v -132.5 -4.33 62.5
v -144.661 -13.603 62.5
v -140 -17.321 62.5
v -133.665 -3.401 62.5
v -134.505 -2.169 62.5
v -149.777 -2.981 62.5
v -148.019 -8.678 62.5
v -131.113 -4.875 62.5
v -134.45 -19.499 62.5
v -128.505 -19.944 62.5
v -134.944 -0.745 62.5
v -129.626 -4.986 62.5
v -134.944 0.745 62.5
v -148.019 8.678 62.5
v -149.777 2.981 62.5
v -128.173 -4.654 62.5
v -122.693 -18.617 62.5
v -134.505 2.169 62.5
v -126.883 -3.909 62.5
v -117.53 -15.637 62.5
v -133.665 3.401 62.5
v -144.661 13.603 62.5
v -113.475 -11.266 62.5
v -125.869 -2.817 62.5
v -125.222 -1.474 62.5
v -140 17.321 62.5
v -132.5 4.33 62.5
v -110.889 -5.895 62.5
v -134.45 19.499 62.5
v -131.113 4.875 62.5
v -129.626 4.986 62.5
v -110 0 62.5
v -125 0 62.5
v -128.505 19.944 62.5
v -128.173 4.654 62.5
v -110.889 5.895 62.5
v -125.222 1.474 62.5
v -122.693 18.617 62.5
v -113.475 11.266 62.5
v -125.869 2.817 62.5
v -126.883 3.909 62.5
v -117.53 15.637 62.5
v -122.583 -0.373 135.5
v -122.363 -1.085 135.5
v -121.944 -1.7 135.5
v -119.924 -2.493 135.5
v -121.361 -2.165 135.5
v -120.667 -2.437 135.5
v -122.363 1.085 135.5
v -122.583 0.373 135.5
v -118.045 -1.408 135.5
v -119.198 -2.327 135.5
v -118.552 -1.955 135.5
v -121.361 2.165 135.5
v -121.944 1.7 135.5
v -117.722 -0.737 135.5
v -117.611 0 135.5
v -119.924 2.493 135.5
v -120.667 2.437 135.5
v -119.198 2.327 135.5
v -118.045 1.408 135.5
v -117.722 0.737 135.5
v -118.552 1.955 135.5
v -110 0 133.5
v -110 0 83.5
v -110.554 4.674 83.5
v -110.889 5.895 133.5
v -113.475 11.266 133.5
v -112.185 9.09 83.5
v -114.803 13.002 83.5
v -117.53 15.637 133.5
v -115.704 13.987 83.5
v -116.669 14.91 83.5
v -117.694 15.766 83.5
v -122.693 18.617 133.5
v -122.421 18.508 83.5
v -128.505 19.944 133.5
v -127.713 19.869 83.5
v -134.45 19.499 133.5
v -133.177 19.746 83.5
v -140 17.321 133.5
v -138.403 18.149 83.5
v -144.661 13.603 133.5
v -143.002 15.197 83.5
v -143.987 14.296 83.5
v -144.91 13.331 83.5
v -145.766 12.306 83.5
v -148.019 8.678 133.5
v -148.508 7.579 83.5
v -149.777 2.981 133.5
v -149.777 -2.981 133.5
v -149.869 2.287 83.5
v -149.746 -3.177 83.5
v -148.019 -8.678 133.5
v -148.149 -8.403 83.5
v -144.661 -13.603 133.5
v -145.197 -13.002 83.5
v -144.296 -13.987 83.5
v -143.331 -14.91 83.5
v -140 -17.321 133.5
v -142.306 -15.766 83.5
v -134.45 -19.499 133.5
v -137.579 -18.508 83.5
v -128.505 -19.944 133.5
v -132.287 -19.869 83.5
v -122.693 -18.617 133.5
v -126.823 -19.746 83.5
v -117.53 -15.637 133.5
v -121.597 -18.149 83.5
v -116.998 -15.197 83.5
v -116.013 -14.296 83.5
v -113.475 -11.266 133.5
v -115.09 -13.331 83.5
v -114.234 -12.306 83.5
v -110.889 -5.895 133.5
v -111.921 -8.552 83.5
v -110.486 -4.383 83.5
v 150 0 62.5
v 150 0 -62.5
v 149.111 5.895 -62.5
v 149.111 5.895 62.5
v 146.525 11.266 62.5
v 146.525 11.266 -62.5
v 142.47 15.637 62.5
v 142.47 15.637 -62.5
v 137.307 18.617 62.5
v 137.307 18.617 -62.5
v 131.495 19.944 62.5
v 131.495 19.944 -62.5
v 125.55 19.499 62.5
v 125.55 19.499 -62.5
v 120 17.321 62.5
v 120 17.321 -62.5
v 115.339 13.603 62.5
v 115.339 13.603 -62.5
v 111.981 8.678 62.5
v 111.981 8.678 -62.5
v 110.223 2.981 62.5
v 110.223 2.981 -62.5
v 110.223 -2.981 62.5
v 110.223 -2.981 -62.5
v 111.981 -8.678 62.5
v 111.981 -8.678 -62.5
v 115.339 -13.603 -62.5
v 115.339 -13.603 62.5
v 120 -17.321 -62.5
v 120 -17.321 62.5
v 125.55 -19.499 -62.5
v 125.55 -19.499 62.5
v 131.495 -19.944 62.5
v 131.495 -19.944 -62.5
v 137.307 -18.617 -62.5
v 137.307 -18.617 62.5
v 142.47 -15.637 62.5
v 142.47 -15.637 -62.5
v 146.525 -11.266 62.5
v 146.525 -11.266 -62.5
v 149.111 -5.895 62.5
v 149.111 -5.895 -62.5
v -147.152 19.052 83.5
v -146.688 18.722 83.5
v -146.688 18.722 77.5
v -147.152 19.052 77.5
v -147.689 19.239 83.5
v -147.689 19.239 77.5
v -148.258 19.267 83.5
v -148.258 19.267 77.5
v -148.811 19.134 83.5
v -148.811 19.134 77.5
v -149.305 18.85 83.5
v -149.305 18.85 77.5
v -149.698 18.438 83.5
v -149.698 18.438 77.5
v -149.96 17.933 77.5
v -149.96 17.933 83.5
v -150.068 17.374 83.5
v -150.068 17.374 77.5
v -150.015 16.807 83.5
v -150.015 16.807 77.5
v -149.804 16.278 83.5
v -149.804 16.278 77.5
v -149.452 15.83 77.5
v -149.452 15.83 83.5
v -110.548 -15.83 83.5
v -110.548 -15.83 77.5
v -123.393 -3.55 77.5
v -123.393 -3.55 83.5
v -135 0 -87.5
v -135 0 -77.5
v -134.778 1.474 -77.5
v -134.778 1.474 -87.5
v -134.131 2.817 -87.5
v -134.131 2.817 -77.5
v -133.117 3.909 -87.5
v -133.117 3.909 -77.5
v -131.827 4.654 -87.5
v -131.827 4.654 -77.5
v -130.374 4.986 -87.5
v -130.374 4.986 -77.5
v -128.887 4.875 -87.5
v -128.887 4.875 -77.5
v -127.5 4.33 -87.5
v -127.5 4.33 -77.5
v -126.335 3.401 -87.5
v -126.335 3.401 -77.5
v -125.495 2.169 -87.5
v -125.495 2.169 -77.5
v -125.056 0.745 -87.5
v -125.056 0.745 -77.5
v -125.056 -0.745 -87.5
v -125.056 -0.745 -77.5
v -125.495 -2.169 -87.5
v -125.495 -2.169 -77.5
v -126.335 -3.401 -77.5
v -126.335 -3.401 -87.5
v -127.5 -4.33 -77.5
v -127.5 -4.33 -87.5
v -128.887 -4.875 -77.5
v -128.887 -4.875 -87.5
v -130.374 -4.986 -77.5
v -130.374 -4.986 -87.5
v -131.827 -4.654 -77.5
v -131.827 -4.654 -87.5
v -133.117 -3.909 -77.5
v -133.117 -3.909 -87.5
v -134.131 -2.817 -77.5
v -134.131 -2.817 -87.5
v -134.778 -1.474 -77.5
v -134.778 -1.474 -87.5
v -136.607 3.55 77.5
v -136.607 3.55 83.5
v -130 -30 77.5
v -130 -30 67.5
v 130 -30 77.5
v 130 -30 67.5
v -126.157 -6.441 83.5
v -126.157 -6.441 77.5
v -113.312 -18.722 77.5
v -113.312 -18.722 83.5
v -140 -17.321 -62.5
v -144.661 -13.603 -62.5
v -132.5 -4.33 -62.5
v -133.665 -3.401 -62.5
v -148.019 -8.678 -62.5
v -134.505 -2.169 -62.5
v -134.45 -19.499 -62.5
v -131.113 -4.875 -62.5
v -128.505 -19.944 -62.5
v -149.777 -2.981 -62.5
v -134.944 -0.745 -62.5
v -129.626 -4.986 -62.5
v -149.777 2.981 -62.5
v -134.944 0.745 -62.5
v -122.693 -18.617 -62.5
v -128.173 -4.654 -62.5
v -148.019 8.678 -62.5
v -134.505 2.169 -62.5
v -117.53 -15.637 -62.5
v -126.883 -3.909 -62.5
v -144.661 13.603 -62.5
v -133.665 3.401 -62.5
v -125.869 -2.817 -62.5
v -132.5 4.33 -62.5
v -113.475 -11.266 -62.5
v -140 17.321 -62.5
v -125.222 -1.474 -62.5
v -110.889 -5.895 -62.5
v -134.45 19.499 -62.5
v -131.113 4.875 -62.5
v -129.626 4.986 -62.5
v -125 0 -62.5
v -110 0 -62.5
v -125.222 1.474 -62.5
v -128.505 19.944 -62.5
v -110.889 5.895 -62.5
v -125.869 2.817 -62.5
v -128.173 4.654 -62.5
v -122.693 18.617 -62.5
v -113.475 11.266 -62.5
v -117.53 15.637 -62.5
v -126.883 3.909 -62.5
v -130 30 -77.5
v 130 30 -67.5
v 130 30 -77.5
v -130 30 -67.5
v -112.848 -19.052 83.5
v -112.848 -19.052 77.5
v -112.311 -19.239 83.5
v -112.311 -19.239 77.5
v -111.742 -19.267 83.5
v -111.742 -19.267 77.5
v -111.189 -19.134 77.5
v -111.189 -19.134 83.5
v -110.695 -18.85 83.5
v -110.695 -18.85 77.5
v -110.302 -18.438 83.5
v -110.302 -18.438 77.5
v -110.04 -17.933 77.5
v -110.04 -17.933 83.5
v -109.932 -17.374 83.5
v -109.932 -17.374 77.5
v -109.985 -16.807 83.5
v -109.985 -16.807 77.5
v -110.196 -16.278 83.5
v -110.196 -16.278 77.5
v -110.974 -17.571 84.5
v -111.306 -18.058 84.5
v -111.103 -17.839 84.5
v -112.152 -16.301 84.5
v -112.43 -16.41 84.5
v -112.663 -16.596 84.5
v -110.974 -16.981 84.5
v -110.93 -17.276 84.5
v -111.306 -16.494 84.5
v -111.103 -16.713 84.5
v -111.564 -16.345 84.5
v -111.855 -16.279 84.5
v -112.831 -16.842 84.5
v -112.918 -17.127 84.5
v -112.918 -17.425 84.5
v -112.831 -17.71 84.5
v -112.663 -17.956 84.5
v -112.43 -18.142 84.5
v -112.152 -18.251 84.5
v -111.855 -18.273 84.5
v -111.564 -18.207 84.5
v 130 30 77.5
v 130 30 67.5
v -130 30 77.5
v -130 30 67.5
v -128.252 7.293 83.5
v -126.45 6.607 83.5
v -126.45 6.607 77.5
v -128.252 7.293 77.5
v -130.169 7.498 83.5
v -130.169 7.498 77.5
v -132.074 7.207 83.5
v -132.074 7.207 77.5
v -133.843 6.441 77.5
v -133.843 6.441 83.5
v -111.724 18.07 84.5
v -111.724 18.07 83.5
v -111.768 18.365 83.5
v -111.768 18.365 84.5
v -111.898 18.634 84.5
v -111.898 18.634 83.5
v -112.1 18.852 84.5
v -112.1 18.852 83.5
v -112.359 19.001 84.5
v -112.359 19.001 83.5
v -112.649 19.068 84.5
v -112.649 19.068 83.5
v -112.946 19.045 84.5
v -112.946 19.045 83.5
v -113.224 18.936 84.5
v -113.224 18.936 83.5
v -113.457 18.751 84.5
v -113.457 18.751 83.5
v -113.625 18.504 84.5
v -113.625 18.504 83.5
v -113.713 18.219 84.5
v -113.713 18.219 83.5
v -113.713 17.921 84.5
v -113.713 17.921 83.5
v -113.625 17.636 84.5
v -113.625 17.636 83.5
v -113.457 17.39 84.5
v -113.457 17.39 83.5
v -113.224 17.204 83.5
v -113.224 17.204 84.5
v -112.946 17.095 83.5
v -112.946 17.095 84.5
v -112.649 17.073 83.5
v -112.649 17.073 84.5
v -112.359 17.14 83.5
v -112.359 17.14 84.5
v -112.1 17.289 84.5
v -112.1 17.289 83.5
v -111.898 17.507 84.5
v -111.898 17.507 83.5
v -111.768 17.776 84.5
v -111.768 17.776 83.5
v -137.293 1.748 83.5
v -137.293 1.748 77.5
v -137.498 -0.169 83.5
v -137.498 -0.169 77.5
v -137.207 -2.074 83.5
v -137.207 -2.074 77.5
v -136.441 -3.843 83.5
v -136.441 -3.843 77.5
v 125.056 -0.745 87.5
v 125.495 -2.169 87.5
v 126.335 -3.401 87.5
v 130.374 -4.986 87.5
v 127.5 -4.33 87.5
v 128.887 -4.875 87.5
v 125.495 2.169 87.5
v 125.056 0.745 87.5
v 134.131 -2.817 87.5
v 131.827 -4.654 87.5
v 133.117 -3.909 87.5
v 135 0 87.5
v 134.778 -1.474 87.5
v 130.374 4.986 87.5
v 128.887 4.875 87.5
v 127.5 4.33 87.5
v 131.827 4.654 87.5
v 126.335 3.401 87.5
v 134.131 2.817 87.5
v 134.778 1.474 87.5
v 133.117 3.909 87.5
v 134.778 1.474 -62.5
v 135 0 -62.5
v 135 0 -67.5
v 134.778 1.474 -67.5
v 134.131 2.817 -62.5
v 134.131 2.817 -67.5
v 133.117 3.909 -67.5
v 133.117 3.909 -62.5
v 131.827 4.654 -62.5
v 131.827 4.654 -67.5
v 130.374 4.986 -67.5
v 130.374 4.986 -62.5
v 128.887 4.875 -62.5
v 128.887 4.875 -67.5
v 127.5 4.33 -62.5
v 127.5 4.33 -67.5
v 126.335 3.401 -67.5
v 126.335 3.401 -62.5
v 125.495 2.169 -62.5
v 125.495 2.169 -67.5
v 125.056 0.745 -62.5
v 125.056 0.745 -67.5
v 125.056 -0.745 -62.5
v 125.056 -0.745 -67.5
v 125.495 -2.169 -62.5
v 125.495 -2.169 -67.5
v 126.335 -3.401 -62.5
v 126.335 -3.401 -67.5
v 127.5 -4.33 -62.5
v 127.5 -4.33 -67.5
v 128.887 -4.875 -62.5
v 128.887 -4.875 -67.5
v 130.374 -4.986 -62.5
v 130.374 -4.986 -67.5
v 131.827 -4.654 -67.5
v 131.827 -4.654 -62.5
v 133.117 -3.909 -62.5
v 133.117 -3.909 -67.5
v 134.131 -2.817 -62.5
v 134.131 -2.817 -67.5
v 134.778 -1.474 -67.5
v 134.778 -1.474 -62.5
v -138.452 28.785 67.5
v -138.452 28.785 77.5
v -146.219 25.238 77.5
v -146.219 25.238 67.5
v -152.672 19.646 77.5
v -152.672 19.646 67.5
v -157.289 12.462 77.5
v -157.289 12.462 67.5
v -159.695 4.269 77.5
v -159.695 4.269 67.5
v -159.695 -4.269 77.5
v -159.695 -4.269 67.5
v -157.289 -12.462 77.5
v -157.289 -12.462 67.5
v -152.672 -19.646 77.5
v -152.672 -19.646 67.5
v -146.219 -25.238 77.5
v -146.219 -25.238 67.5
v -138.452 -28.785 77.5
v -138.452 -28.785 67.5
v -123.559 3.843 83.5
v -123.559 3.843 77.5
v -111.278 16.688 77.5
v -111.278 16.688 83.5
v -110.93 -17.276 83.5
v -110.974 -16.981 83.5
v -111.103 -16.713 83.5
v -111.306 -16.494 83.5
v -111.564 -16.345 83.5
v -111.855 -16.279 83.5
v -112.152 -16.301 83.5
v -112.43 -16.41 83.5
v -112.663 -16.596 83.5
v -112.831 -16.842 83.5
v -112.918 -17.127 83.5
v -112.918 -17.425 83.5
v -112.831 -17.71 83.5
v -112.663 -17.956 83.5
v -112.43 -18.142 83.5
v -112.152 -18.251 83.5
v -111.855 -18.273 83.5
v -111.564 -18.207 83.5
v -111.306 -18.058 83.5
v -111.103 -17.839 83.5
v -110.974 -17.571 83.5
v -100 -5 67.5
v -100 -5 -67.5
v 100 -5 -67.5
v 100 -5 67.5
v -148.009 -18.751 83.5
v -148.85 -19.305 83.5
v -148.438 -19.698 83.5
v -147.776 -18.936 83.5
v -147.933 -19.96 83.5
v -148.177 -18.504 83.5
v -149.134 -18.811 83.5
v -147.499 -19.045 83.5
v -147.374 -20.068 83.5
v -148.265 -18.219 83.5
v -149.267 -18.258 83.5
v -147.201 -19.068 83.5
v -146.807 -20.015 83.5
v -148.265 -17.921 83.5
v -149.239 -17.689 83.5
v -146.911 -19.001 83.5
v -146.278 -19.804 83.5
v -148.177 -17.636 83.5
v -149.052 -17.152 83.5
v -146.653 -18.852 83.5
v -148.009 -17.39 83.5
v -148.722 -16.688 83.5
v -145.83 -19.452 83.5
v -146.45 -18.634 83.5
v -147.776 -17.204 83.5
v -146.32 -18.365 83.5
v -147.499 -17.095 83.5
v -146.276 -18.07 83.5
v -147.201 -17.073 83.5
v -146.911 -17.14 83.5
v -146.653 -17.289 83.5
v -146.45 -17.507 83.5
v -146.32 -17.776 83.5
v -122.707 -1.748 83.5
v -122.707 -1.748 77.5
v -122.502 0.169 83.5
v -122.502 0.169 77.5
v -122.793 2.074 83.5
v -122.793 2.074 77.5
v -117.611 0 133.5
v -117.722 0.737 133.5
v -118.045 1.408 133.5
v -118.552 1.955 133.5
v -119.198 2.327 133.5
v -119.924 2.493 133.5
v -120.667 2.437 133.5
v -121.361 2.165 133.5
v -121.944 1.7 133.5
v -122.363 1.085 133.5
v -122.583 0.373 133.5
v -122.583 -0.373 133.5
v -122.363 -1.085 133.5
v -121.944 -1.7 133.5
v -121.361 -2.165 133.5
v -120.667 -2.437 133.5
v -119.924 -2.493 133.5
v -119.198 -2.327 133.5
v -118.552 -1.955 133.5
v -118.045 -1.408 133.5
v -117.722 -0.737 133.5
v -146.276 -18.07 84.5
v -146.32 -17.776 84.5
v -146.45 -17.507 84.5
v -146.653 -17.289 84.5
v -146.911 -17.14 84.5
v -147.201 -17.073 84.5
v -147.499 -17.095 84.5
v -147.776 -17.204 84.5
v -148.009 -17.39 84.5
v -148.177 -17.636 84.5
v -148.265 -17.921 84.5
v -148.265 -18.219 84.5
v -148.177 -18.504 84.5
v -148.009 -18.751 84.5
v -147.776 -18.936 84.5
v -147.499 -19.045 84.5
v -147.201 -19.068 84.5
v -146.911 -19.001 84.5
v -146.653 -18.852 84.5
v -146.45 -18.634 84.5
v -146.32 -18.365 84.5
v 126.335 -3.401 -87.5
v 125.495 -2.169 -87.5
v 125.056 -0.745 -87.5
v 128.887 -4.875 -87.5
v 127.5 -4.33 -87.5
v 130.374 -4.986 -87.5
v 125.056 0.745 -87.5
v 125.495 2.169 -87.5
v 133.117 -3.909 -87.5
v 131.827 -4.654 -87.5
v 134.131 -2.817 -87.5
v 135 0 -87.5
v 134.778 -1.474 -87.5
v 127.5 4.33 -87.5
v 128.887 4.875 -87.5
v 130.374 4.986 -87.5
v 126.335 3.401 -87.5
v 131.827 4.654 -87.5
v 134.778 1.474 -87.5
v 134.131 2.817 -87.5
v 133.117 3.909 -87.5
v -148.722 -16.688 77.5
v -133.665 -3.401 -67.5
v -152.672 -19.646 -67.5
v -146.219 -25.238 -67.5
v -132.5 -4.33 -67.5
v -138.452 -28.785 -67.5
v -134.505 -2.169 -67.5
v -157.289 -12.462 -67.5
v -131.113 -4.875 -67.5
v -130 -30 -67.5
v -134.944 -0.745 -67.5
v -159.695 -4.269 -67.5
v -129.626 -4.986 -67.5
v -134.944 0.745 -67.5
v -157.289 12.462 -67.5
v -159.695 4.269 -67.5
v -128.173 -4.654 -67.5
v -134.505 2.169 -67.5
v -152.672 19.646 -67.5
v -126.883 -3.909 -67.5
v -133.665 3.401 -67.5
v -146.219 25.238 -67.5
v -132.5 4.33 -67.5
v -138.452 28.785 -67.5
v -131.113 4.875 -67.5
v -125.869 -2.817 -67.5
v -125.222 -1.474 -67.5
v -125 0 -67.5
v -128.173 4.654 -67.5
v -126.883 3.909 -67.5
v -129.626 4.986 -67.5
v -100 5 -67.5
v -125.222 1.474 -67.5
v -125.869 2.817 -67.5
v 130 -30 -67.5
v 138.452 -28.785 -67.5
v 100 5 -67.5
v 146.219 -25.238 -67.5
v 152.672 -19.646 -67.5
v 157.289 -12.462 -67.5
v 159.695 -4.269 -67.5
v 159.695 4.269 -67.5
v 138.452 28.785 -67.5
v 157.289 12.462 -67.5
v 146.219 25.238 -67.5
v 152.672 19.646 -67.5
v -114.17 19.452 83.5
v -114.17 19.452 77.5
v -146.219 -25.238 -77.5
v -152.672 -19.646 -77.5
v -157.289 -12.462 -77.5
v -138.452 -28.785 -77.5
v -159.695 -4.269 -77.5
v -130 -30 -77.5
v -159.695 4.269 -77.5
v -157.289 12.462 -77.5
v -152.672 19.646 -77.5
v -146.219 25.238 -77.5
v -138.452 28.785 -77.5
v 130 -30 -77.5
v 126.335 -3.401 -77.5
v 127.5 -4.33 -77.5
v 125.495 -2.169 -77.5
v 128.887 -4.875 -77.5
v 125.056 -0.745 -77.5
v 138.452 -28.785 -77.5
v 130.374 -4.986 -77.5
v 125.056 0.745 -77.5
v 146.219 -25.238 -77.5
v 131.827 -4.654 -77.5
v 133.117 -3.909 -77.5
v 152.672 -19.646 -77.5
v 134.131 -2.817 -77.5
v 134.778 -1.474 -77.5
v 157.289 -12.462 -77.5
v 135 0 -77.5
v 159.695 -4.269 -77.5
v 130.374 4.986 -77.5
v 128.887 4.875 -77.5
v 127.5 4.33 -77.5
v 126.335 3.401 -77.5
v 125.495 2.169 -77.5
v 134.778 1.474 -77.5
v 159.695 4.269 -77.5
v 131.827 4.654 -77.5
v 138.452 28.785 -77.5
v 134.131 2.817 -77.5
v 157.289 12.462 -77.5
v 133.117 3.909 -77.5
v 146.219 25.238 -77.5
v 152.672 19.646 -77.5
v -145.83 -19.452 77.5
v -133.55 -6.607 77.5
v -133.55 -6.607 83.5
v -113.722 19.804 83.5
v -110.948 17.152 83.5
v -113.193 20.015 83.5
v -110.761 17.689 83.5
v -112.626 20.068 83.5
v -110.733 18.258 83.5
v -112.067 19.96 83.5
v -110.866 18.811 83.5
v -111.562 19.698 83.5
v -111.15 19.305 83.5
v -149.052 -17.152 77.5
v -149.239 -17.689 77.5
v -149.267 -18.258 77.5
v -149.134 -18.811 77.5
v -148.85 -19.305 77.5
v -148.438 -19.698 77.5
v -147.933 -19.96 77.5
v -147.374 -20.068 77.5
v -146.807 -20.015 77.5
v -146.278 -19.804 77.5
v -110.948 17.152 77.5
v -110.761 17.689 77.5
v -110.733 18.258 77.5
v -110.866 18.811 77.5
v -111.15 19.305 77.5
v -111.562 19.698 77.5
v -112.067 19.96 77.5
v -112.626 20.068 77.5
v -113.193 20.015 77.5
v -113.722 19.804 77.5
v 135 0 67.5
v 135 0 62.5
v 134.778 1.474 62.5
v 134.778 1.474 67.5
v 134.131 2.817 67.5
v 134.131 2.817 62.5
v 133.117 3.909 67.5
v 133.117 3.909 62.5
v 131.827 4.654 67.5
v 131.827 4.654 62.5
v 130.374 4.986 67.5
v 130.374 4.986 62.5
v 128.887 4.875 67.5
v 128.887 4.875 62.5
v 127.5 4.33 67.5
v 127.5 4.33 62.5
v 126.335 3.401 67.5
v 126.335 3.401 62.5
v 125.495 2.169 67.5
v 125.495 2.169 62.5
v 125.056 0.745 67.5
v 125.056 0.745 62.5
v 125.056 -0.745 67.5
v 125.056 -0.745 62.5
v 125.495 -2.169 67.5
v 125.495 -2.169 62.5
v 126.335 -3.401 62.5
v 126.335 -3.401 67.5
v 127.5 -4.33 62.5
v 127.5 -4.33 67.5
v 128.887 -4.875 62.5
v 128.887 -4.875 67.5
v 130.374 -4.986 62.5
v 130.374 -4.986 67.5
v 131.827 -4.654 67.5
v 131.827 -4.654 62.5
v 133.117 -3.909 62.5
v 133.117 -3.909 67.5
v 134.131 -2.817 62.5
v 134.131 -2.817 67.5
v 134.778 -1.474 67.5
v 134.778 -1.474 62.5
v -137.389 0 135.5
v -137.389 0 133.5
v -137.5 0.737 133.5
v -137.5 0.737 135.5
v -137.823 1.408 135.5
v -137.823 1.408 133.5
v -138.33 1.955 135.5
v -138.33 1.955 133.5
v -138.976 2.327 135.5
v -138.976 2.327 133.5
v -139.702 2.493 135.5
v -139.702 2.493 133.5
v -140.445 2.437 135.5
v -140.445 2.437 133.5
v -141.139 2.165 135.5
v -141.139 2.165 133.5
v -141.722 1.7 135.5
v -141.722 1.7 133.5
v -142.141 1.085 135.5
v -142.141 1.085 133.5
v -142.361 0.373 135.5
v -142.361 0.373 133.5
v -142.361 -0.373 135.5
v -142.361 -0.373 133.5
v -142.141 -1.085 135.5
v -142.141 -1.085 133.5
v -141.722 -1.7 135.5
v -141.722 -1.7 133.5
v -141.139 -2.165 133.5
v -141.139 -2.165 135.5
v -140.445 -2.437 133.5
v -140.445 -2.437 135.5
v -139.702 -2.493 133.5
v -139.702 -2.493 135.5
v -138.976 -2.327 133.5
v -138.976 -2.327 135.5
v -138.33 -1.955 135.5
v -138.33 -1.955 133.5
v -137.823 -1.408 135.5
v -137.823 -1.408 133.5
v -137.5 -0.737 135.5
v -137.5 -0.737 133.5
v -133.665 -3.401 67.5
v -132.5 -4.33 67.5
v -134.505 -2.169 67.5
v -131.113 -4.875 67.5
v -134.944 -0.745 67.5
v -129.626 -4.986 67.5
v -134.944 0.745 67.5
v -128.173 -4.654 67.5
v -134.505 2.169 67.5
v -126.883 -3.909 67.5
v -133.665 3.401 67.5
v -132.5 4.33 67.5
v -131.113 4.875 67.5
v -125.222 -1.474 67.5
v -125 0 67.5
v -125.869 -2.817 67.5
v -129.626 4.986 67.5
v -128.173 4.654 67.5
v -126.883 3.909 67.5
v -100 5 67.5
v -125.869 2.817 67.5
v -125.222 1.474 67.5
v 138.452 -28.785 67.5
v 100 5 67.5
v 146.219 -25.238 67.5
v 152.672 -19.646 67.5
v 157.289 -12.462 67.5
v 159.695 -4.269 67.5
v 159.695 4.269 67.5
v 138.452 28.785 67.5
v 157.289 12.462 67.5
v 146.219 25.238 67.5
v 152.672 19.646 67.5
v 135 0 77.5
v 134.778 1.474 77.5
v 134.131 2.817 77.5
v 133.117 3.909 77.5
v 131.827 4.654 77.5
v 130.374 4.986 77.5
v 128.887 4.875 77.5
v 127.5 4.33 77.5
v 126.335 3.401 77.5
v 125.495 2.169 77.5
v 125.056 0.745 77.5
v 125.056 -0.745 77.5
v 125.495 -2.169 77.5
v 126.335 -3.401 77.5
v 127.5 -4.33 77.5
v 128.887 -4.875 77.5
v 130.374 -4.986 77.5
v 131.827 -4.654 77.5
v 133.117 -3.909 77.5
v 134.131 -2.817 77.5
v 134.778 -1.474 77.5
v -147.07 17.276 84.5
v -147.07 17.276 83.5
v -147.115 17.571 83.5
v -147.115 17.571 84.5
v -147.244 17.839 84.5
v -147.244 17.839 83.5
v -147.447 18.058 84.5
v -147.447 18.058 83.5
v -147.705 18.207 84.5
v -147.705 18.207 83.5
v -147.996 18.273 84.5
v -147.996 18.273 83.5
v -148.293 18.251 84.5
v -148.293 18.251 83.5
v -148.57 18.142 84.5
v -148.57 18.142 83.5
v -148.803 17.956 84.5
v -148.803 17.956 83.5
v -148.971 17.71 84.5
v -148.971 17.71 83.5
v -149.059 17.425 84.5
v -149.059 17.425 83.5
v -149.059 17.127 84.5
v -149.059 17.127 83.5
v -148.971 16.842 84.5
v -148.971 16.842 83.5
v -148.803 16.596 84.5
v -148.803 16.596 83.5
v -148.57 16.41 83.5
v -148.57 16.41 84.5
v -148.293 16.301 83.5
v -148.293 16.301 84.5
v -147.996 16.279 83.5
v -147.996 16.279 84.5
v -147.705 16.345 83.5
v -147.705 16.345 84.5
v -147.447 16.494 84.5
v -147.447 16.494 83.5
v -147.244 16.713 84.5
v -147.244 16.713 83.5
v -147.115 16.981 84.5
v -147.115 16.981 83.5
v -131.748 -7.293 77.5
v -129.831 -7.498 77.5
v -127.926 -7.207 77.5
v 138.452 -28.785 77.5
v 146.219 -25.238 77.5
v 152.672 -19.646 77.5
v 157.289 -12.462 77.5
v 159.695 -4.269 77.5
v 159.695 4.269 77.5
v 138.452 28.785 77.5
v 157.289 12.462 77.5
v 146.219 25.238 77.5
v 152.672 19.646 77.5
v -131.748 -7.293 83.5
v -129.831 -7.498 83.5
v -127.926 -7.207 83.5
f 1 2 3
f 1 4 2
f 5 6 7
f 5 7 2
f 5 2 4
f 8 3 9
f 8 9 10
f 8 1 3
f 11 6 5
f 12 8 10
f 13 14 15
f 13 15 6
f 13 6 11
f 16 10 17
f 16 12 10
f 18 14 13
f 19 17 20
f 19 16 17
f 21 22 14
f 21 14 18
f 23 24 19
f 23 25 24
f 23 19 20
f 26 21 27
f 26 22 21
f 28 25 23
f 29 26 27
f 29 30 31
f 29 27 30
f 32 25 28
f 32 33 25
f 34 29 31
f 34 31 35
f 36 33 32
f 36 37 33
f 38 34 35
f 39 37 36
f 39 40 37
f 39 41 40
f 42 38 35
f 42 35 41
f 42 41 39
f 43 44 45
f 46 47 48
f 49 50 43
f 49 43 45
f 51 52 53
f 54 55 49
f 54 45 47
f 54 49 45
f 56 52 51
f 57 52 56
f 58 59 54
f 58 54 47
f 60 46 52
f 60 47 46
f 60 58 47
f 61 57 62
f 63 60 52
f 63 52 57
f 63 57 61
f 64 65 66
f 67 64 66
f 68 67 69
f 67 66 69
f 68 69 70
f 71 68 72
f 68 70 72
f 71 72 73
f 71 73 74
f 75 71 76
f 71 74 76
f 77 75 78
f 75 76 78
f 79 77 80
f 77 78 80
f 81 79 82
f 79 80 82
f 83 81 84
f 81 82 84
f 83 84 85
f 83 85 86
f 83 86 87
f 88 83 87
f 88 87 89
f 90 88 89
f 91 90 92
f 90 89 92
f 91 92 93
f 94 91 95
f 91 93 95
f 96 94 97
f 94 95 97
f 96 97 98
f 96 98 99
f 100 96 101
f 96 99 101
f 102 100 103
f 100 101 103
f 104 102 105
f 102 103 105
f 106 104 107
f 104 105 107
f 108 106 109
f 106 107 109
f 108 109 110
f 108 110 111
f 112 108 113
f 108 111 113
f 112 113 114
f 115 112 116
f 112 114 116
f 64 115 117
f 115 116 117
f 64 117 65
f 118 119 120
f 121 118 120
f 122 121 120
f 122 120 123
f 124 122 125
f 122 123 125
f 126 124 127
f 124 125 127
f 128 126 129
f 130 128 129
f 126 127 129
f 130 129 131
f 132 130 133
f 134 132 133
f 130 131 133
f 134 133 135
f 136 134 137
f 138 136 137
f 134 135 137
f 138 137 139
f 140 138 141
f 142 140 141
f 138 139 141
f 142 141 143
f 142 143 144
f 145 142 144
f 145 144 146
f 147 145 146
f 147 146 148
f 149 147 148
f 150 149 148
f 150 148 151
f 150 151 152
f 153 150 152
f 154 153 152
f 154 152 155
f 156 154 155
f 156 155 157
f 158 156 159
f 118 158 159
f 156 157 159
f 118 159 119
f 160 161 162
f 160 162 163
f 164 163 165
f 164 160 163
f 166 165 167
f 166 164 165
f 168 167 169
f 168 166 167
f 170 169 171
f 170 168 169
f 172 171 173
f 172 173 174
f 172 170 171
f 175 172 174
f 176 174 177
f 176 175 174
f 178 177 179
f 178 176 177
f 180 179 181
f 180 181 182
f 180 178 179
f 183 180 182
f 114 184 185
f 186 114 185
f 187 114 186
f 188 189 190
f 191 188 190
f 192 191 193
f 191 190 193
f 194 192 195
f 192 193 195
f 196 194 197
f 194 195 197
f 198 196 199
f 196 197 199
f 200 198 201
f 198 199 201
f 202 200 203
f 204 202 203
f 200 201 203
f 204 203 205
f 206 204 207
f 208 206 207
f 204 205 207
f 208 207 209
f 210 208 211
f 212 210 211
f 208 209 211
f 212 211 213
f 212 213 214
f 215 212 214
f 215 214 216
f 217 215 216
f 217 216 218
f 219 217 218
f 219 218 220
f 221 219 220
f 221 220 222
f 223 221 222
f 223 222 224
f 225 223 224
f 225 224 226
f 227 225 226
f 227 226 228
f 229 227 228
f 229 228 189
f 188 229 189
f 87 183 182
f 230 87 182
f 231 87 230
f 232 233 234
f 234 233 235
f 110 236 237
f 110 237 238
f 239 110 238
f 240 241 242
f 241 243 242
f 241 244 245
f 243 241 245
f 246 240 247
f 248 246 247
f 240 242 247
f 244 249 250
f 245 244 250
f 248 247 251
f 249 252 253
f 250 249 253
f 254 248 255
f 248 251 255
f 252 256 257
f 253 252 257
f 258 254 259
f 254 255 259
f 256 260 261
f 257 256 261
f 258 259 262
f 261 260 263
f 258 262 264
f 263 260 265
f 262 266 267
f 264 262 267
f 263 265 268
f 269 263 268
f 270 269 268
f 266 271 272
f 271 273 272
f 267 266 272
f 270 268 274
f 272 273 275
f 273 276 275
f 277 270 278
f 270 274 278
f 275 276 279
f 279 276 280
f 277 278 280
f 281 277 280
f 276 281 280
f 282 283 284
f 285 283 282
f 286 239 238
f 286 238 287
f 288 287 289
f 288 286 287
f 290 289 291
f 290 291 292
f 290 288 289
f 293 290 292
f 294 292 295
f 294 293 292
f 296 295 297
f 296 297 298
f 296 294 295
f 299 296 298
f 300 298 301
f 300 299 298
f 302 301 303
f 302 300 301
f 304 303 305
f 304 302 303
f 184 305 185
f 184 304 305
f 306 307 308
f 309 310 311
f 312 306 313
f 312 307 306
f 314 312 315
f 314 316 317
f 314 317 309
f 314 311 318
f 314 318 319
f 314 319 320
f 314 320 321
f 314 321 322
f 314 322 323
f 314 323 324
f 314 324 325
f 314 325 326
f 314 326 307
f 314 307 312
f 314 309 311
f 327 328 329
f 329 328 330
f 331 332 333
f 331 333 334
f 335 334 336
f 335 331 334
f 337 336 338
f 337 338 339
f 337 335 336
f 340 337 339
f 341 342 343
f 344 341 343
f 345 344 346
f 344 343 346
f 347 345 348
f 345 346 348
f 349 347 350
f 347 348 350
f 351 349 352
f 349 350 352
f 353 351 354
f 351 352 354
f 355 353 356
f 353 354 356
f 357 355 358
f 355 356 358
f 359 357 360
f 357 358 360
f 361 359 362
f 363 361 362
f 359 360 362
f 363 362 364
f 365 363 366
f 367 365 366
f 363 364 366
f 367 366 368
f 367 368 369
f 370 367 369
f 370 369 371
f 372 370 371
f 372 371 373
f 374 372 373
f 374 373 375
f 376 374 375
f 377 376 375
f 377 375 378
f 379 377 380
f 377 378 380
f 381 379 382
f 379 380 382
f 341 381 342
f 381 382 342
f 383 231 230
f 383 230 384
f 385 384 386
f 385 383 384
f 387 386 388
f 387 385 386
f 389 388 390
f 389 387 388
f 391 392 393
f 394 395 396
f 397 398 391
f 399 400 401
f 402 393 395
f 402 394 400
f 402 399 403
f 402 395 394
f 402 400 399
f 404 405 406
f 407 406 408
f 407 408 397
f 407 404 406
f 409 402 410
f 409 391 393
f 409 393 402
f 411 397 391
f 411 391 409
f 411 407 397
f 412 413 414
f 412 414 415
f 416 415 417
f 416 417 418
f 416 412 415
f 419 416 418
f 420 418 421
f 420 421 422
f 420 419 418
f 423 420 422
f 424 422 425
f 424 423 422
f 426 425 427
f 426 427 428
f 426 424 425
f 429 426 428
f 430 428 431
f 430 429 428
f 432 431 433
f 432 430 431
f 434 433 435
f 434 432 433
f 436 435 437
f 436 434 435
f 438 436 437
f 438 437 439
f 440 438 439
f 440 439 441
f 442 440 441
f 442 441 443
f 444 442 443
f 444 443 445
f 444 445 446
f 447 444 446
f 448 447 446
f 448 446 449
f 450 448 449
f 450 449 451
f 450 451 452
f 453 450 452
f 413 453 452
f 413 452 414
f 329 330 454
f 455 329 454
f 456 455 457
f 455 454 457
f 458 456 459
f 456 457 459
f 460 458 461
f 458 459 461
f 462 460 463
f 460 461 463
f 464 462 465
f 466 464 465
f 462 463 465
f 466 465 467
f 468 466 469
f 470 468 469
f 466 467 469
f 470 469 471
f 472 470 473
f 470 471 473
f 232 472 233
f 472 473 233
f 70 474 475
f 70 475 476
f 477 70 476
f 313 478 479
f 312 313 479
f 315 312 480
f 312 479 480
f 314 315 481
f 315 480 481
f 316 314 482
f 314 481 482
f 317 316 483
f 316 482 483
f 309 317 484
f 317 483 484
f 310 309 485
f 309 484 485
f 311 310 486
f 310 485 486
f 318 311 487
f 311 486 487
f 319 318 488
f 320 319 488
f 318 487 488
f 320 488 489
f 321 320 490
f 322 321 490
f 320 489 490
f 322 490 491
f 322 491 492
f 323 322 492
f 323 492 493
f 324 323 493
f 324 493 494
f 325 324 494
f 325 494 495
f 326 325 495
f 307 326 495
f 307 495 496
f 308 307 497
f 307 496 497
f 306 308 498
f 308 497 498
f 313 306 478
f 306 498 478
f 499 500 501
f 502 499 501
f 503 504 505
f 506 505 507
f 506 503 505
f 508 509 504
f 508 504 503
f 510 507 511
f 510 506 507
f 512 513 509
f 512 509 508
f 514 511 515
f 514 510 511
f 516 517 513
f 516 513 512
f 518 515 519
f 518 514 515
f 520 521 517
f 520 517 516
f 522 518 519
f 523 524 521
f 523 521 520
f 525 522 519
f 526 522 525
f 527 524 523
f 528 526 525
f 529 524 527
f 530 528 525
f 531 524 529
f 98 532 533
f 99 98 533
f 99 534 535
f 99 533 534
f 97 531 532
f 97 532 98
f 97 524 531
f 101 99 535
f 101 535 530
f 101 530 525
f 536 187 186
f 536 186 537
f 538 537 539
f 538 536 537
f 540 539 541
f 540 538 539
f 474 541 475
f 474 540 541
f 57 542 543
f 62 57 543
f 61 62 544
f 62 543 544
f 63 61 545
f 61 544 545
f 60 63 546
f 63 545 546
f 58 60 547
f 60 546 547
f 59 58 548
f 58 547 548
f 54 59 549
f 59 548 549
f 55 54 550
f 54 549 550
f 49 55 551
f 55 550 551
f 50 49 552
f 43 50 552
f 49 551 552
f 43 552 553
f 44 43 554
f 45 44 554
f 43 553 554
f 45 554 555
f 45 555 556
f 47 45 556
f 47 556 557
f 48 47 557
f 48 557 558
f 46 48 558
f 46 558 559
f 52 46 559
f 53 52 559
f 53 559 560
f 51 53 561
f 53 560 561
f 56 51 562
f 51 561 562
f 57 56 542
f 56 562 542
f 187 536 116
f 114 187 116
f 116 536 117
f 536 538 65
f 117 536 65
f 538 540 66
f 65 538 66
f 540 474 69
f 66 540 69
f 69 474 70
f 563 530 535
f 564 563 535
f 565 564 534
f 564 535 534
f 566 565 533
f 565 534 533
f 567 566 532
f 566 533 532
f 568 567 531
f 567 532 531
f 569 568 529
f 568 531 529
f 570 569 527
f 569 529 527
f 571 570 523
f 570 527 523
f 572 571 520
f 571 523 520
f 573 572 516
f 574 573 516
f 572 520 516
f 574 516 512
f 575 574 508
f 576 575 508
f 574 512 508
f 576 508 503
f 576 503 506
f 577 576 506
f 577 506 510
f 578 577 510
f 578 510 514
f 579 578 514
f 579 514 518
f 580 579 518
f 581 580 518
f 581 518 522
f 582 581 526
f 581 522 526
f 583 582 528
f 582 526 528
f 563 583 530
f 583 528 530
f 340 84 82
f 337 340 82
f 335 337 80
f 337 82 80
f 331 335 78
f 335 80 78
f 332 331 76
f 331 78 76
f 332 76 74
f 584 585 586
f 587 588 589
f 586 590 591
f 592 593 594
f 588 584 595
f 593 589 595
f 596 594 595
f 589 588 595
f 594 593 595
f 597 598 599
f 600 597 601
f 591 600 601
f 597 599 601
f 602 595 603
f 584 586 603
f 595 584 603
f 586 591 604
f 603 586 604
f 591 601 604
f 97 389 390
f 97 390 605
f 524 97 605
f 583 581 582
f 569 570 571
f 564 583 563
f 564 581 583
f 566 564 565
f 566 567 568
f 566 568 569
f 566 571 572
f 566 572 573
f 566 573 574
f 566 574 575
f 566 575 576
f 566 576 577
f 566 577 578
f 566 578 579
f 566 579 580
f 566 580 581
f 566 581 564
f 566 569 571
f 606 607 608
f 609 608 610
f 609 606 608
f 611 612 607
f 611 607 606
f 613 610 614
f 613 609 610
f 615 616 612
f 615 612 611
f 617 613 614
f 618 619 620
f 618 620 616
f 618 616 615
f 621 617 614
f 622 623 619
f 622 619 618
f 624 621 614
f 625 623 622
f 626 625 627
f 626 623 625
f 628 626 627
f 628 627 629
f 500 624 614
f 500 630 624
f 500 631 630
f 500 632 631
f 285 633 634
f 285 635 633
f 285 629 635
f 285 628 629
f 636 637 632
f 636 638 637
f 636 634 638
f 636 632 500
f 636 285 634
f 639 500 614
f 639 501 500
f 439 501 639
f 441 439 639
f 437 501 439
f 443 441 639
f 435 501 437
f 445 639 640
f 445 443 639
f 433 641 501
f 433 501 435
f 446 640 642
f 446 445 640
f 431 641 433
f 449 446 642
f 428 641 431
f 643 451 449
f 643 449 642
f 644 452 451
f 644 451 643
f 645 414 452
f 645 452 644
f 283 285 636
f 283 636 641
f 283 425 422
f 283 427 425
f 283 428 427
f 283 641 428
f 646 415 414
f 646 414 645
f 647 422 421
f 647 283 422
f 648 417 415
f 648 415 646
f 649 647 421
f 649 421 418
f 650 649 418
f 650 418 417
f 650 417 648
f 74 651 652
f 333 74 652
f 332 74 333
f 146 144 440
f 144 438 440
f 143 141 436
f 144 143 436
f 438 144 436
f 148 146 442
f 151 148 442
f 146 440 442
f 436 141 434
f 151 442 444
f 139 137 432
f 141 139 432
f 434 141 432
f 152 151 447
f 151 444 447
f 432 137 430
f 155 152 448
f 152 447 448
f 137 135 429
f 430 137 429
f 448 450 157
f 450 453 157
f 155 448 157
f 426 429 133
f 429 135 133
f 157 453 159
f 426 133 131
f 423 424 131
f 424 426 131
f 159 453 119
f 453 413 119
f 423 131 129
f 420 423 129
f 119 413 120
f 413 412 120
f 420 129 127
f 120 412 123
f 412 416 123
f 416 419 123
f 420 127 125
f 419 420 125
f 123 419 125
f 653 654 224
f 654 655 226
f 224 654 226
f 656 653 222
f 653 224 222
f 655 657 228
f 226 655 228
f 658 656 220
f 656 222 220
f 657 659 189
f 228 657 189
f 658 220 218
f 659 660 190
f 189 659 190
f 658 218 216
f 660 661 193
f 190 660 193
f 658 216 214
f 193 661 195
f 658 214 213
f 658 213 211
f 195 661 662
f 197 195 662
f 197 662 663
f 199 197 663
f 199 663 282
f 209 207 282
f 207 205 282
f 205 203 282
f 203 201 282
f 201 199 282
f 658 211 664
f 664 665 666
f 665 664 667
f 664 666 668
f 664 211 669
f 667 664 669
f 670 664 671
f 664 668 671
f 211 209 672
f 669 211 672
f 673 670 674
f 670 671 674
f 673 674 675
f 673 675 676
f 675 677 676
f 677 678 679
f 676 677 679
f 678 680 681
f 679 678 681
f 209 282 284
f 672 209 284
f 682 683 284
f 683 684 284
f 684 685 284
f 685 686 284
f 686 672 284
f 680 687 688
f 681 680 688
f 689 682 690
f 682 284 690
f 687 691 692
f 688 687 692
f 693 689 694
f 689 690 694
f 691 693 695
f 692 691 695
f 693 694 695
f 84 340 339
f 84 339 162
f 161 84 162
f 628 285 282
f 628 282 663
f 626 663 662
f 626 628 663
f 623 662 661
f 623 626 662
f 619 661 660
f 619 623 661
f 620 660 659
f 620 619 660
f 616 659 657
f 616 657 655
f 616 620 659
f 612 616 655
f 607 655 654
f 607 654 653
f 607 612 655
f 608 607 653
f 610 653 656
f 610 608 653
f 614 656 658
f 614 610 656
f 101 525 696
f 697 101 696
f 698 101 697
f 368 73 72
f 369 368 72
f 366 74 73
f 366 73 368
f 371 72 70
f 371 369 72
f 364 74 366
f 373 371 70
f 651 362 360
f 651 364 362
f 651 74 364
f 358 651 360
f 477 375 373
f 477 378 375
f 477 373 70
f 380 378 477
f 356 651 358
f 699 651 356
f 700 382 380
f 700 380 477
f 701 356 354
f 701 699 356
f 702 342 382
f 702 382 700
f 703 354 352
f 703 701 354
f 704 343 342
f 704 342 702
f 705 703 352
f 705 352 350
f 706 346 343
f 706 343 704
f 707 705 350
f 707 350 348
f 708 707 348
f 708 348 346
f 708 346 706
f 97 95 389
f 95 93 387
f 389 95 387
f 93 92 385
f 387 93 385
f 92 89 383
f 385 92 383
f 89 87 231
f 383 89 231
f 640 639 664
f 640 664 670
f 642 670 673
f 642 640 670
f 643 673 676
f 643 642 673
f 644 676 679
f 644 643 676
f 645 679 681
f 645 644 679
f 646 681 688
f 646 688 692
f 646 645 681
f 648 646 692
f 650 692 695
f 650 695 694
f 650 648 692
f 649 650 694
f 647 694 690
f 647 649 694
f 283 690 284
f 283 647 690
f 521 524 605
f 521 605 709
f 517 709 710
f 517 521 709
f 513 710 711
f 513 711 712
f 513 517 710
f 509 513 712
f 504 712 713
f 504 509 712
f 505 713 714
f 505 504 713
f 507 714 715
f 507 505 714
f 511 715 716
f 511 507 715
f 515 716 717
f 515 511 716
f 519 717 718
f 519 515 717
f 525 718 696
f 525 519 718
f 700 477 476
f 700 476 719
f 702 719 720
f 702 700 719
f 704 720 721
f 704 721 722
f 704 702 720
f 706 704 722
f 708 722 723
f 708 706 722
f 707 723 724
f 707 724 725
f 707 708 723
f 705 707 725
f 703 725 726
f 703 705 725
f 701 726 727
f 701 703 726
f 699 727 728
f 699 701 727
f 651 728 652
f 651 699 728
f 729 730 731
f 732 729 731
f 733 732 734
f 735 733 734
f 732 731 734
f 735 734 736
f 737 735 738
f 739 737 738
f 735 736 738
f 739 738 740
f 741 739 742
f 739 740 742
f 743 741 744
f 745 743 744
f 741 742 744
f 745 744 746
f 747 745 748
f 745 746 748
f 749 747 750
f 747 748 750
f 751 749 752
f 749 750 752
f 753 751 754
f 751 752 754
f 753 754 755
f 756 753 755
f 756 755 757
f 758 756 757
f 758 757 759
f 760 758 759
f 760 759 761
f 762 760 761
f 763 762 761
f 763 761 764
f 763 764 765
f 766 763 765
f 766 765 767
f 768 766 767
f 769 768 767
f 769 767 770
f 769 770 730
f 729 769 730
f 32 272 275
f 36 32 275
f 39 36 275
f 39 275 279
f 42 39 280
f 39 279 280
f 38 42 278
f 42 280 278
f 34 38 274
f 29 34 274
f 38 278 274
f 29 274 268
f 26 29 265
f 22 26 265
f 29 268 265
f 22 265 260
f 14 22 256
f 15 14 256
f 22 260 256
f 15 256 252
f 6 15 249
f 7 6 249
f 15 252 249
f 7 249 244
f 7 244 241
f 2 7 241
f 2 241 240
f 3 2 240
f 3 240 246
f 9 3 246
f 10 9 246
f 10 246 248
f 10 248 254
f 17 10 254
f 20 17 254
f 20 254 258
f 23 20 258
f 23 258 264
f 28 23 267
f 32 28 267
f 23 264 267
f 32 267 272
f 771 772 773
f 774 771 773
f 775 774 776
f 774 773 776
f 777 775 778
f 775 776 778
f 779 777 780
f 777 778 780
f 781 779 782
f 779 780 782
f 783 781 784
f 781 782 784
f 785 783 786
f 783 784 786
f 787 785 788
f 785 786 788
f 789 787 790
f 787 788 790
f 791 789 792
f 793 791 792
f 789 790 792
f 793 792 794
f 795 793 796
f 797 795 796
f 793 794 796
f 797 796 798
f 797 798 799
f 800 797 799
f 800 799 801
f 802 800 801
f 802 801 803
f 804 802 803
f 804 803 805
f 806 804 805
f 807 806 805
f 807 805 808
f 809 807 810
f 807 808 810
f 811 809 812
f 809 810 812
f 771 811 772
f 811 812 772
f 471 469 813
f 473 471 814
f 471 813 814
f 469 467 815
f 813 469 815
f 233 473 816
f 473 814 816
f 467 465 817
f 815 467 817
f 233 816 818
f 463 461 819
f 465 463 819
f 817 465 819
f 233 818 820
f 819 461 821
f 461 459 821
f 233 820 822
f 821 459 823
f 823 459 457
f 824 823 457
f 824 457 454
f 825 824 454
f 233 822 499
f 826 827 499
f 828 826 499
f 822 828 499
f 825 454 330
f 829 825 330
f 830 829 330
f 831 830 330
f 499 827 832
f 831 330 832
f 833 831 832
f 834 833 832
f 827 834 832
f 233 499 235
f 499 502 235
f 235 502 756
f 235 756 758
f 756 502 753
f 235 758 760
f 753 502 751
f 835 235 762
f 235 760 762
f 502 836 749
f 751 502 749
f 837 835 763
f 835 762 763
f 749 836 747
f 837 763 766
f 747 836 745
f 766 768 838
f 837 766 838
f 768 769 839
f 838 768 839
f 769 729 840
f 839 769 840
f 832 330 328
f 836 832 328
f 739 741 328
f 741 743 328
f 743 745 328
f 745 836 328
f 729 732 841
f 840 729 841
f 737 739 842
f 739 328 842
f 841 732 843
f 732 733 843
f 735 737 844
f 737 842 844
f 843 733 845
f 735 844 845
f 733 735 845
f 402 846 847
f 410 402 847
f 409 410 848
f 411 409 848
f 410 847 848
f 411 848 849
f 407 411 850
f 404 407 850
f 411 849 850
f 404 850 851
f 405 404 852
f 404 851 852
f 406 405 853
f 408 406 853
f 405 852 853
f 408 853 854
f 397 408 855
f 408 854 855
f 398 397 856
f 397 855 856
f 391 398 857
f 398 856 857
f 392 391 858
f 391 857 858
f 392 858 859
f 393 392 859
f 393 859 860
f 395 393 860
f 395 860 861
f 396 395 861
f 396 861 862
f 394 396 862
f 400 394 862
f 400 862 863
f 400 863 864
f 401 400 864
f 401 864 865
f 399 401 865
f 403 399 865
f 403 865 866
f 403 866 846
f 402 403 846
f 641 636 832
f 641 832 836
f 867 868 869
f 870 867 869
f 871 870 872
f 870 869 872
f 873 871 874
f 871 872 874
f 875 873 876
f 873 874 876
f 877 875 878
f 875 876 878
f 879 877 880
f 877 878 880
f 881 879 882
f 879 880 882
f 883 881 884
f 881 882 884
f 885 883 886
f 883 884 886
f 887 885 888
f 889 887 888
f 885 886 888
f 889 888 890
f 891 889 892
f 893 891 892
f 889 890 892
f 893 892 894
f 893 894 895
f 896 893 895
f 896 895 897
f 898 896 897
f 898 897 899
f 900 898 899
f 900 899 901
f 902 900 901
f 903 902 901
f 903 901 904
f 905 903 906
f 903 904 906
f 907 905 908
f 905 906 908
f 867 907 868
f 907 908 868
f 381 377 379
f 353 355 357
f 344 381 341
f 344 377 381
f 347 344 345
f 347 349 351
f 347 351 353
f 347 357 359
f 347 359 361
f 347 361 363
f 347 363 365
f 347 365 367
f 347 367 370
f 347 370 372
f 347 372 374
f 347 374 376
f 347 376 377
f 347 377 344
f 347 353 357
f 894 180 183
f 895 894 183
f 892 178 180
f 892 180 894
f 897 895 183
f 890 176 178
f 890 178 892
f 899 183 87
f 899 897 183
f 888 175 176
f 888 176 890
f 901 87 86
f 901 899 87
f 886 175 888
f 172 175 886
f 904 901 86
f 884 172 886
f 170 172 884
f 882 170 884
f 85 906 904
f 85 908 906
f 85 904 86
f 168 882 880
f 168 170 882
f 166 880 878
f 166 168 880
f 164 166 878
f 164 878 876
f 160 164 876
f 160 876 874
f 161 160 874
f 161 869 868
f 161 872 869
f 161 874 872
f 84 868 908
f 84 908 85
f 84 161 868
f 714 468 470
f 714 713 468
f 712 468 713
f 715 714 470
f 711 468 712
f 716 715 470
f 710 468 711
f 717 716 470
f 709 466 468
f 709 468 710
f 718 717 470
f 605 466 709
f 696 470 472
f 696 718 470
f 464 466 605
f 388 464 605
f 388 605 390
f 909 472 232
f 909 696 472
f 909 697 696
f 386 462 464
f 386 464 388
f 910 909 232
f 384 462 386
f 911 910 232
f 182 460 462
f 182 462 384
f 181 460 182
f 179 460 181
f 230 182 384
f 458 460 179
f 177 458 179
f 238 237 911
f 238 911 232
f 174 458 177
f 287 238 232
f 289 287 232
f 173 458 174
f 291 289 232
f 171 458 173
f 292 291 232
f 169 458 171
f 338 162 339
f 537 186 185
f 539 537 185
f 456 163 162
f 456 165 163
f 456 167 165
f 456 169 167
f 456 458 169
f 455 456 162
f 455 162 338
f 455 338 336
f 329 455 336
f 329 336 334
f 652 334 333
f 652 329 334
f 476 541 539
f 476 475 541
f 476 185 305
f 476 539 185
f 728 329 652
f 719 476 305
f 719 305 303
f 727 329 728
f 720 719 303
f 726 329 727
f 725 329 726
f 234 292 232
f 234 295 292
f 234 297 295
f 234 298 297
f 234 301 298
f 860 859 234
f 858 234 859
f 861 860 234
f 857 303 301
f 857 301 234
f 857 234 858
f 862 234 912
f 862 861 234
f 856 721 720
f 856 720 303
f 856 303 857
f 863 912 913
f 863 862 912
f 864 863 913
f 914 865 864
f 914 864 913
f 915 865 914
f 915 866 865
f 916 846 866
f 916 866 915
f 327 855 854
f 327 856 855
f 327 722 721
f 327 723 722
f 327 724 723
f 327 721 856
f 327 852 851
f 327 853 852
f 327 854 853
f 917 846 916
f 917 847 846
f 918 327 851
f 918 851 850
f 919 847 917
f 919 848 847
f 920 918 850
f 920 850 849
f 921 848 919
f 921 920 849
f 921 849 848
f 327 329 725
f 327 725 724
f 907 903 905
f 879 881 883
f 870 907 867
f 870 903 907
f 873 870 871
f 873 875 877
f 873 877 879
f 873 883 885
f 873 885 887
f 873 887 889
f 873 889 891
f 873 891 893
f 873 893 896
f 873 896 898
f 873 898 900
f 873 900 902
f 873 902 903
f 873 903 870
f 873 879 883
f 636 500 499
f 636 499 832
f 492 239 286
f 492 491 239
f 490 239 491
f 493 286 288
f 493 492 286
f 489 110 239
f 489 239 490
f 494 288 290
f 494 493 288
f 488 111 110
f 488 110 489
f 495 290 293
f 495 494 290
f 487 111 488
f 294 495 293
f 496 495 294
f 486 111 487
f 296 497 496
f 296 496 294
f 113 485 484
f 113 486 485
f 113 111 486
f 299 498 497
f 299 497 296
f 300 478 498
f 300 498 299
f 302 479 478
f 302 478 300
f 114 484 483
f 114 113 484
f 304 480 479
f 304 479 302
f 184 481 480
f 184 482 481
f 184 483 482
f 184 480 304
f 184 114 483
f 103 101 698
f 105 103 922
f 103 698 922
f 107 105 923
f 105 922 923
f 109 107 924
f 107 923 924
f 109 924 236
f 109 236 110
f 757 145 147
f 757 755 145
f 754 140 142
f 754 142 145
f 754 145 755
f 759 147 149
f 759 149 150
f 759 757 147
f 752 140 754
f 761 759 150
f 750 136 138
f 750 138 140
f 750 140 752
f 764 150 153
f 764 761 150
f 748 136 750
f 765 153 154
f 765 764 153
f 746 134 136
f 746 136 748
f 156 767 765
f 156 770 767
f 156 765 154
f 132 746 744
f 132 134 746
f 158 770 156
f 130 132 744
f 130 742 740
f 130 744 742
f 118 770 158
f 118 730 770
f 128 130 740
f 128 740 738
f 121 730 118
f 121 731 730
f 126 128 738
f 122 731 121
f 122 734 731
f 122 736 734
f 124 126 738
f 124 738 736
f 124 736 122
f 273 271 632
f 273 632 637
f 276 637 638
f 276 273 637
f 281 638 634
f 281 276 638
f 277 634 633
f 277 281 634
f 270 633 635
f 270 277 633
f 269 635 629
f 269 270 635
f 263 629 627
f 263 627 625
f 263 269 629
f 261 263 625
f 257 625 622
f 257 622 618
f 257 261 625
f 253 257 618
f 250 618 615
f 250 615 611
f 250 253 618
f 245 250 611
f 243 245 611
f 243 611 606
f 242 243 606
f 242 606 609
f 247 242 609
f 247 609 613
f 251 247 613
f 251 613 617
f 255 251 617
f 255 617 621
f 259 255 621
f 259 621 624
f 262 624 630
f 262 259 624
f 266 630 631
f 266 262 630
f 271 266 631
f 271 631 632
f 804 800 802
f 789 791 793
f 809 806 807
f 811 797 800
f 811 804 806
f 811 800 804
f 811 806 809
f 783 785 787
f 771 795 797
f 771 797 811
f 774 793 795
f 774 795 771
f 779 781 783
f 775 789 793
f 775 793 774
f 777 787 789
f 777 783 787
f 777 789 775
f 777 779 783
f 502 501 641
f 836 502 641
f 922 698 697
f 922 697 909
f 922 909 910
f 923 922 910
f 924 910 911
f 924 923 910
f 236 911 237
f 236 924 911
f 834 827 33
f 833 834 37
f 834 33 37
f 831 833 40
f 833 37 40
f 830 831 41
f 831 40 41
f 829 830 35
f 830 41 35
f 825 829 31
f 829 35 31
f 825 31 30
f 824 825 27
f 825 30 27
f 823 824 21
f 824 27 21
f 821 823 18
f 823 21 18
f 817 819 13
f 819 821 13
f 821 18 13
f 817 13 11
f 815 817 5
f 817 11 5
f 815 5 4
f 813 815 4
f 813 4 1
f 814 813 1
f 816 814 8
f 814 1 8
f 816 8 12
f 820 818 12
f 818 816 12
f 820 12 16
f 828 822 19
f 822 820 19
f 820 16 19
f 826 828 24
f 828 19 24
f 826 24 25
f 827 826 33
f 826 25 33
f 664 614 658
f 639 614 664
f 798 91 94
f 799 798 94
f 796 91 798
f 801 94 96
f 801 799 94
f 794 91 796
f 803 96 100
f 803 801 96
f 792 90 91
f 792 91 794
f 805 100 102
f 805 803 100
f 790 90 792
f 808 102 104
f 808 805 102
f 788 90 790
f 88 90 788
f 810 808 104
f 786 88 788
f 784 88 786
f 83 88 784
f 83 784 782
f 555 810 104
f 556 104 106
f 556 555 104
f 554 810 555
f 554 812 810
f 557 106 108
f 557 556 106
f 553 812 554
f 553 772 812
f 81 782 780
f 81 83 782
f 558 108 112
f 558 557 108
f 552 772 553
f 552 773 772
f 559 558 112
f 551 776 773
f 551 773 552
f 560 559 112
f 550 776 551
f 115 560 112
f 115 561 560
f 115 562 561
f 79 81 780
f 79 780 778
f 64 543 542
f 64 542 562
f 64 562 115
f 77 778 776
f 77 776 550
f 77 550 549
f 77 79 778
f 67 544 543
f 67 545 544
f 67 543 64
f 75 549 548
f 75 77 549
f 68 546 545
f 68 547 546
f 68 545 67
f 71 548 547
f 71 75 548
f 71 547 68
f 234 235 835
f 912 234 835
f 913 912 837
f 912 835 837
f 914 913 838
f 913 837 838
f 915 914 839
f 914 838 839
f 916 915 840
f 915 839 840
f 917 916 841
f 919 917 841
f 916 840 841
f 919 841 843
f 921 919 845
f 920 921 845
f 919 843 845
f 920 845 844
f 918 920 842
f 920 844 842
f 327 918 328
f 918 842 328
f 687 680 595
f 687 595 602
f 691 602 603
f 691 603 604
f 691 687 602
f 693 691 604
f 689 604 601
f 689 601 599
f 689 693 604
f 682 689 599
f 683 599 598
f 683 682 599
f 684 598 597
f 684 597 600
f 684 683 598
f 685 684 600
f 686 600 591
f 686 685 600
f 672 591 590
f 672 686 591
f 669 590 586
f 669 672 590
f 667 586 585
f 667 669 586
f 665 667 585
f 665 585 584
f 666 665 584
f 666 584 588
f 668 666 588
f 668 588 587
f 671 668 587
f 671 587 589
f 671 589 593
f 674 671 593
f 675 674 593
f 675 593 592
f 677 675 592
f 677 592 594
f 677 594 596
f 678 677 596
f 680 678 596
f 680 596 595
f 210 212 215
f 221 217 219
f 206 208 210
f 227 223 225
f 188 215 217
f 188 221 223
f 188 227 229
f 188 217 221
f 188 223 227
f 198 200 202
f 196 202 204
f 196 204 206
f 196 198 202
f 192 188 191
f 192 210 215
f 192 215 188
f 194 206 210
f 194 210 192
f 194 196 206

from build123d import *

# Parameters (mm, degrees)
BOSS_EXTRUDE1_DEPTH        = 62.5
BOSS_EXTRUDE1_DEPTH_BACK   = 62.5
SKETCH2_R                  = 20
BOSS_EXTRUDE1_2_DEPTH      = 62.5
BOSS_EXTRUDE1_2_DEPTH_BACK = 62.5
SKETCH4_R                  = 5
BOSS_EXTRUDE5_DEPTH        = 5
SKETCH9_R                  = 5
BOSS_EXTRUDE6_DEPTH        = 25
BOSS_EXTRUDE8_OUTLINE_R    = 5
BOSS_EXTRUDE8_DEPTH        = 10
SKETCH12_W                 = 200
SKETCH12_H                 = 10
BOSS_EXTRUDE9_DEPTH        = 135
SKETCH15_R                 = 5
BOSS_EXTRUDE10_DEPTH       = 6
SKETCH16_R                 = 20
BOSS_EXTRUDE11_DEPTH       = 50
MIRROR6_COPY_1_SKETCH_R    = 5
MIRROR6_COPY_1_DEPTH       = 25
MIRROR6_COPY_2_SKETCH_R    = 5
MIRROR6_COPY_2_DEPTH       = 25
SKETCH17_R                 = 2.5
BOSS_EXTRUDE12_DEPTH       = 2
BOSS_EXTRUDE13_START       = 6
SKETCH18_R                 = 5
BOSS_EXTRUDE13_DEPTH       = 6
SKETCH20_R                 = 1
BOSS_EXTRUDE15_DEPTH       = 1


# Read off the part's stored shape, not the designer's step: Boss-Extrude8
with BuildPart() as part:
    # Sketch2 → Boss-Extrude1 (new, two sides: drawn at the far end of the back side and taken through both)
    with BuildSketch(Plane.XY.offset(-BOSS_EXTRUDE1_DEPTH_BACK)):
        with Locations((-130, 0)):
            Circle(SKETCH2_R)
    extrude(amount=BOSS_EXTRUDE1_DEPTH + BOSS_EXTRUDE1_DEPTH_BACK)

    # Sketch4 → Boss-Extrude5 (add)
    with BuildSketch(Plane.XY.offset(62.5)):
        with Locations((-130, 0)):
            Circle(SKETCH4_R)
    boss_extrude5 = extrude(amount=BOSS_EXTRUDE5_DEPTH)

    # Mirror2: Boss-Extrude5 across plane
    add(boss_extrude5.mirror(Plane.XY))



with BuildPart() as body_2:
    # Sketch2 → Boss-Extrude1 2 (new, two sides: drawn at the far end of the back side and taken through both)
    with BuildSketch(Plane.XY.offset(-BOSS_EXTRUDE1_2_DEPTH_BACK)):
        with Locations((130, 0)):
            Circle(SKETCH2_R)
    extrude(amount=BOSS_EXTRUDE1_2_DEPTH + BOSS_EXTRUDE1_2_DEPTH_BACK)

    # Sketch9 → Boss-Extrude6 (add)
    with BuildSketch(Plane.XY.offset(62.5)):
        with Locations((130, 0)):
            Circle(SKETCH9_R)
    boss_extrude6 = extrude(amount=BOSS_EXTRUDE6_DEPTH)

    # Mirror4: Boss-Extrude6 across plane
    add(boss_extrude6.mirror(Plane.XY))


with BuildPart() as part_1:
    add(part.part)

    add(body_2.part)  # Boss-Extrude8 merges body 2
    # Boss-Extrude8 outline → Boss-Extrude8 (add)
    with BuildSketch(Plane.XY.offset(67.5)):
        with BuildLine():
            ThreePointArc((130, -30), (160, 0), (130, 30))
            Line((130, 30), (-130, 30))
            ThreePointArc((-130, 30), (-160, 0), (-130, -30))
            Line((-130, -30), (130, -30))
        make_face()
        with Locations((130, 0)):
            Circle(BOSS_EXTRUDE8_OUTLINE_R, mode=Mode.SUBTRACT)
    boss_extrude8 = extrude(amount=BOSS_EXTRUDE8_DEPTH)

    # Mirror5: Boss-Extrude8 across plane
    add(boss_extrude8.mirror(Plane.XY))

    # Sketch12 → Boss-Extrude9 (add)
    with BuildSketch(Plane.XY.offset(-67.5)):
        Rectangle(SKETCH12_W, SKETCH12_H)
    extrude(amount=BOSS_EXTRUDE9_DEPTH)

    # Sketch15 → Boss-Extrude10 (add)
    with BuildSketch(Plane.XY.offset(77.5)):
        with Locations((-130, 0)):
            Circle(SKETCH15_R)
    extrude(amount=BOSS_EXTRUDE10_DEPTH)

    # Sketch16 → Boss-Extrude11 (add)
    with BuildSketch(Plane.XY.offset(83.5)):
        with Locations((-130, 0)):
            Circle(SKETCH16_R)
    extrude(amount=BOSS_EXTRUDE11_DEPTH)

    # Mirror6 copy 1 sketch → Mirror6 copy 1 (add)
    with BuildSketch(Plane(origin=(0, 0, -62.5), x_dir=(-1, 0, 0), z_dir=(0, 0, -1))):
        with Locations((130, 0)):
            Circle(MIRROR6_COPY_1_SKETCH_R)
    extrude(amount=MIRROR6_COPY_1_DEPTH)

    # Mirror6 copy 2 sketch → Mirror6 copy 2 (add)
    with BuildSketch(Plane(origin=(0, 0, 62.5), x_dir=(-1, 0, 0), z_dir=(0, 0, 1))):
        with Locations((130, 0)):
            Circle(MIRROR6_COPY_2_SKETCH_R)
    extrude(amount=MIRROR6_COPY_2_DEPTH)

    # Sketch17 → Boss-Extrude12 (add)
    with BuildSketch(Plane.XY.offset(133.5)):
        with Locations((-139.88898439, 0)):
            Circle(SKETCH17_R)
        with Locations((-120.11101561, 0)):
            Circle(SKETCH17_R)
    extrude(amount=BOSS_EXTRUDE12_DEPTH)

    # Sketch18 → Boss-Extrude13 (add)
    with BuildSketch(Plane.XY.offset(77.5).offset(BOSS_EXTRUDE13_START)):
        with BuildLine():
            Line((-133.842725931, 6.440765282), (-146.688296152, 18.721665833))
            ThreePointArc((-146.688296152, 18.721665833), (-149.516009312, 18.658118354), (-149.452461834, 15.830405194))
            Line((-149.452461834, 15.830405194), (-136.606891613, 3.549504643))
            ThreePointArc((-136.606891613, 3.549504643), (-137.498106816, -0.168505698), (-136.440765282, -3.842725931))
            Line((-136.440765282, -3.842725931), (-148.721665833, -16.688296152))
            ThreePointArc((-148.721665833, -16.688296152), (-148.658118354, -19.516009312), (-145.830405194, -19.452461834))
            Line((-145.830405194, -19.452461834), (-133.549504643, -6.606891613))
            ThreePointArc((-133.549504643, -6.606891613), (-129.831494302, -7.498106816), (-126.157274069, -6.440765282))
            Line((-126.157274069, -6.440765282), (-113.311703848, -18.721665833))
            ThreePointArc((-113.311703848, -18.721665833), (-110.483990688, -18.658118354), (-110.547538166, -15.830405194))
            Line((-110.547538166, -15.830405194), (-123.393108387, -3.549504643))
            ThreePointArc((-123.393108387, -3.549504643), (-122.501893184, 0.168505698), (-123.559234718, 3.842725931))
            Line((-123.559234718, 3.842725931), (-111.278334167, 16.688296152))
            ThreePointArc((-111.278334167, 16.688296152), (-111.341881646, 19.516009312), (-114.169594806, 19.452461834))
            Line((-114.169594806, 19.452461834), (-126.450495357, 6.606891613))
            ThreePointArc((-126.450495357, 6.606891613), (-130.168505698, 7.498106816), (-133.842725931, 6.440765282))
        make_face()
        with Locations((-130, 0)):
            Circle(SKETCH18_R, mode=Mode.SUBTRACT)
    extrude(amount=-BOSS_EXTRUDE13_DEPTH)

    # Sketch20 → Boss-Extrude15 (add)
    with BuildSketch(Plane.XY.offset(83.5)):
        with Locations((-148.070378993, 17.276035513)):
            Circle(SKETCH20_R)
        with Locations((-112.723964487, 18.070378993)):
            Circle(SKETCH20_R)
        with Locations((-147.276035513, -18.070378993)):
            Circle(SKETCH20_R)
        with Locations((-111.929621007, -17.276035513)):
            Circle(SKETCH20_R)
    extrude(amount=BOSS_EXTRUDE15_DEPTH)


solid = part_1.part
